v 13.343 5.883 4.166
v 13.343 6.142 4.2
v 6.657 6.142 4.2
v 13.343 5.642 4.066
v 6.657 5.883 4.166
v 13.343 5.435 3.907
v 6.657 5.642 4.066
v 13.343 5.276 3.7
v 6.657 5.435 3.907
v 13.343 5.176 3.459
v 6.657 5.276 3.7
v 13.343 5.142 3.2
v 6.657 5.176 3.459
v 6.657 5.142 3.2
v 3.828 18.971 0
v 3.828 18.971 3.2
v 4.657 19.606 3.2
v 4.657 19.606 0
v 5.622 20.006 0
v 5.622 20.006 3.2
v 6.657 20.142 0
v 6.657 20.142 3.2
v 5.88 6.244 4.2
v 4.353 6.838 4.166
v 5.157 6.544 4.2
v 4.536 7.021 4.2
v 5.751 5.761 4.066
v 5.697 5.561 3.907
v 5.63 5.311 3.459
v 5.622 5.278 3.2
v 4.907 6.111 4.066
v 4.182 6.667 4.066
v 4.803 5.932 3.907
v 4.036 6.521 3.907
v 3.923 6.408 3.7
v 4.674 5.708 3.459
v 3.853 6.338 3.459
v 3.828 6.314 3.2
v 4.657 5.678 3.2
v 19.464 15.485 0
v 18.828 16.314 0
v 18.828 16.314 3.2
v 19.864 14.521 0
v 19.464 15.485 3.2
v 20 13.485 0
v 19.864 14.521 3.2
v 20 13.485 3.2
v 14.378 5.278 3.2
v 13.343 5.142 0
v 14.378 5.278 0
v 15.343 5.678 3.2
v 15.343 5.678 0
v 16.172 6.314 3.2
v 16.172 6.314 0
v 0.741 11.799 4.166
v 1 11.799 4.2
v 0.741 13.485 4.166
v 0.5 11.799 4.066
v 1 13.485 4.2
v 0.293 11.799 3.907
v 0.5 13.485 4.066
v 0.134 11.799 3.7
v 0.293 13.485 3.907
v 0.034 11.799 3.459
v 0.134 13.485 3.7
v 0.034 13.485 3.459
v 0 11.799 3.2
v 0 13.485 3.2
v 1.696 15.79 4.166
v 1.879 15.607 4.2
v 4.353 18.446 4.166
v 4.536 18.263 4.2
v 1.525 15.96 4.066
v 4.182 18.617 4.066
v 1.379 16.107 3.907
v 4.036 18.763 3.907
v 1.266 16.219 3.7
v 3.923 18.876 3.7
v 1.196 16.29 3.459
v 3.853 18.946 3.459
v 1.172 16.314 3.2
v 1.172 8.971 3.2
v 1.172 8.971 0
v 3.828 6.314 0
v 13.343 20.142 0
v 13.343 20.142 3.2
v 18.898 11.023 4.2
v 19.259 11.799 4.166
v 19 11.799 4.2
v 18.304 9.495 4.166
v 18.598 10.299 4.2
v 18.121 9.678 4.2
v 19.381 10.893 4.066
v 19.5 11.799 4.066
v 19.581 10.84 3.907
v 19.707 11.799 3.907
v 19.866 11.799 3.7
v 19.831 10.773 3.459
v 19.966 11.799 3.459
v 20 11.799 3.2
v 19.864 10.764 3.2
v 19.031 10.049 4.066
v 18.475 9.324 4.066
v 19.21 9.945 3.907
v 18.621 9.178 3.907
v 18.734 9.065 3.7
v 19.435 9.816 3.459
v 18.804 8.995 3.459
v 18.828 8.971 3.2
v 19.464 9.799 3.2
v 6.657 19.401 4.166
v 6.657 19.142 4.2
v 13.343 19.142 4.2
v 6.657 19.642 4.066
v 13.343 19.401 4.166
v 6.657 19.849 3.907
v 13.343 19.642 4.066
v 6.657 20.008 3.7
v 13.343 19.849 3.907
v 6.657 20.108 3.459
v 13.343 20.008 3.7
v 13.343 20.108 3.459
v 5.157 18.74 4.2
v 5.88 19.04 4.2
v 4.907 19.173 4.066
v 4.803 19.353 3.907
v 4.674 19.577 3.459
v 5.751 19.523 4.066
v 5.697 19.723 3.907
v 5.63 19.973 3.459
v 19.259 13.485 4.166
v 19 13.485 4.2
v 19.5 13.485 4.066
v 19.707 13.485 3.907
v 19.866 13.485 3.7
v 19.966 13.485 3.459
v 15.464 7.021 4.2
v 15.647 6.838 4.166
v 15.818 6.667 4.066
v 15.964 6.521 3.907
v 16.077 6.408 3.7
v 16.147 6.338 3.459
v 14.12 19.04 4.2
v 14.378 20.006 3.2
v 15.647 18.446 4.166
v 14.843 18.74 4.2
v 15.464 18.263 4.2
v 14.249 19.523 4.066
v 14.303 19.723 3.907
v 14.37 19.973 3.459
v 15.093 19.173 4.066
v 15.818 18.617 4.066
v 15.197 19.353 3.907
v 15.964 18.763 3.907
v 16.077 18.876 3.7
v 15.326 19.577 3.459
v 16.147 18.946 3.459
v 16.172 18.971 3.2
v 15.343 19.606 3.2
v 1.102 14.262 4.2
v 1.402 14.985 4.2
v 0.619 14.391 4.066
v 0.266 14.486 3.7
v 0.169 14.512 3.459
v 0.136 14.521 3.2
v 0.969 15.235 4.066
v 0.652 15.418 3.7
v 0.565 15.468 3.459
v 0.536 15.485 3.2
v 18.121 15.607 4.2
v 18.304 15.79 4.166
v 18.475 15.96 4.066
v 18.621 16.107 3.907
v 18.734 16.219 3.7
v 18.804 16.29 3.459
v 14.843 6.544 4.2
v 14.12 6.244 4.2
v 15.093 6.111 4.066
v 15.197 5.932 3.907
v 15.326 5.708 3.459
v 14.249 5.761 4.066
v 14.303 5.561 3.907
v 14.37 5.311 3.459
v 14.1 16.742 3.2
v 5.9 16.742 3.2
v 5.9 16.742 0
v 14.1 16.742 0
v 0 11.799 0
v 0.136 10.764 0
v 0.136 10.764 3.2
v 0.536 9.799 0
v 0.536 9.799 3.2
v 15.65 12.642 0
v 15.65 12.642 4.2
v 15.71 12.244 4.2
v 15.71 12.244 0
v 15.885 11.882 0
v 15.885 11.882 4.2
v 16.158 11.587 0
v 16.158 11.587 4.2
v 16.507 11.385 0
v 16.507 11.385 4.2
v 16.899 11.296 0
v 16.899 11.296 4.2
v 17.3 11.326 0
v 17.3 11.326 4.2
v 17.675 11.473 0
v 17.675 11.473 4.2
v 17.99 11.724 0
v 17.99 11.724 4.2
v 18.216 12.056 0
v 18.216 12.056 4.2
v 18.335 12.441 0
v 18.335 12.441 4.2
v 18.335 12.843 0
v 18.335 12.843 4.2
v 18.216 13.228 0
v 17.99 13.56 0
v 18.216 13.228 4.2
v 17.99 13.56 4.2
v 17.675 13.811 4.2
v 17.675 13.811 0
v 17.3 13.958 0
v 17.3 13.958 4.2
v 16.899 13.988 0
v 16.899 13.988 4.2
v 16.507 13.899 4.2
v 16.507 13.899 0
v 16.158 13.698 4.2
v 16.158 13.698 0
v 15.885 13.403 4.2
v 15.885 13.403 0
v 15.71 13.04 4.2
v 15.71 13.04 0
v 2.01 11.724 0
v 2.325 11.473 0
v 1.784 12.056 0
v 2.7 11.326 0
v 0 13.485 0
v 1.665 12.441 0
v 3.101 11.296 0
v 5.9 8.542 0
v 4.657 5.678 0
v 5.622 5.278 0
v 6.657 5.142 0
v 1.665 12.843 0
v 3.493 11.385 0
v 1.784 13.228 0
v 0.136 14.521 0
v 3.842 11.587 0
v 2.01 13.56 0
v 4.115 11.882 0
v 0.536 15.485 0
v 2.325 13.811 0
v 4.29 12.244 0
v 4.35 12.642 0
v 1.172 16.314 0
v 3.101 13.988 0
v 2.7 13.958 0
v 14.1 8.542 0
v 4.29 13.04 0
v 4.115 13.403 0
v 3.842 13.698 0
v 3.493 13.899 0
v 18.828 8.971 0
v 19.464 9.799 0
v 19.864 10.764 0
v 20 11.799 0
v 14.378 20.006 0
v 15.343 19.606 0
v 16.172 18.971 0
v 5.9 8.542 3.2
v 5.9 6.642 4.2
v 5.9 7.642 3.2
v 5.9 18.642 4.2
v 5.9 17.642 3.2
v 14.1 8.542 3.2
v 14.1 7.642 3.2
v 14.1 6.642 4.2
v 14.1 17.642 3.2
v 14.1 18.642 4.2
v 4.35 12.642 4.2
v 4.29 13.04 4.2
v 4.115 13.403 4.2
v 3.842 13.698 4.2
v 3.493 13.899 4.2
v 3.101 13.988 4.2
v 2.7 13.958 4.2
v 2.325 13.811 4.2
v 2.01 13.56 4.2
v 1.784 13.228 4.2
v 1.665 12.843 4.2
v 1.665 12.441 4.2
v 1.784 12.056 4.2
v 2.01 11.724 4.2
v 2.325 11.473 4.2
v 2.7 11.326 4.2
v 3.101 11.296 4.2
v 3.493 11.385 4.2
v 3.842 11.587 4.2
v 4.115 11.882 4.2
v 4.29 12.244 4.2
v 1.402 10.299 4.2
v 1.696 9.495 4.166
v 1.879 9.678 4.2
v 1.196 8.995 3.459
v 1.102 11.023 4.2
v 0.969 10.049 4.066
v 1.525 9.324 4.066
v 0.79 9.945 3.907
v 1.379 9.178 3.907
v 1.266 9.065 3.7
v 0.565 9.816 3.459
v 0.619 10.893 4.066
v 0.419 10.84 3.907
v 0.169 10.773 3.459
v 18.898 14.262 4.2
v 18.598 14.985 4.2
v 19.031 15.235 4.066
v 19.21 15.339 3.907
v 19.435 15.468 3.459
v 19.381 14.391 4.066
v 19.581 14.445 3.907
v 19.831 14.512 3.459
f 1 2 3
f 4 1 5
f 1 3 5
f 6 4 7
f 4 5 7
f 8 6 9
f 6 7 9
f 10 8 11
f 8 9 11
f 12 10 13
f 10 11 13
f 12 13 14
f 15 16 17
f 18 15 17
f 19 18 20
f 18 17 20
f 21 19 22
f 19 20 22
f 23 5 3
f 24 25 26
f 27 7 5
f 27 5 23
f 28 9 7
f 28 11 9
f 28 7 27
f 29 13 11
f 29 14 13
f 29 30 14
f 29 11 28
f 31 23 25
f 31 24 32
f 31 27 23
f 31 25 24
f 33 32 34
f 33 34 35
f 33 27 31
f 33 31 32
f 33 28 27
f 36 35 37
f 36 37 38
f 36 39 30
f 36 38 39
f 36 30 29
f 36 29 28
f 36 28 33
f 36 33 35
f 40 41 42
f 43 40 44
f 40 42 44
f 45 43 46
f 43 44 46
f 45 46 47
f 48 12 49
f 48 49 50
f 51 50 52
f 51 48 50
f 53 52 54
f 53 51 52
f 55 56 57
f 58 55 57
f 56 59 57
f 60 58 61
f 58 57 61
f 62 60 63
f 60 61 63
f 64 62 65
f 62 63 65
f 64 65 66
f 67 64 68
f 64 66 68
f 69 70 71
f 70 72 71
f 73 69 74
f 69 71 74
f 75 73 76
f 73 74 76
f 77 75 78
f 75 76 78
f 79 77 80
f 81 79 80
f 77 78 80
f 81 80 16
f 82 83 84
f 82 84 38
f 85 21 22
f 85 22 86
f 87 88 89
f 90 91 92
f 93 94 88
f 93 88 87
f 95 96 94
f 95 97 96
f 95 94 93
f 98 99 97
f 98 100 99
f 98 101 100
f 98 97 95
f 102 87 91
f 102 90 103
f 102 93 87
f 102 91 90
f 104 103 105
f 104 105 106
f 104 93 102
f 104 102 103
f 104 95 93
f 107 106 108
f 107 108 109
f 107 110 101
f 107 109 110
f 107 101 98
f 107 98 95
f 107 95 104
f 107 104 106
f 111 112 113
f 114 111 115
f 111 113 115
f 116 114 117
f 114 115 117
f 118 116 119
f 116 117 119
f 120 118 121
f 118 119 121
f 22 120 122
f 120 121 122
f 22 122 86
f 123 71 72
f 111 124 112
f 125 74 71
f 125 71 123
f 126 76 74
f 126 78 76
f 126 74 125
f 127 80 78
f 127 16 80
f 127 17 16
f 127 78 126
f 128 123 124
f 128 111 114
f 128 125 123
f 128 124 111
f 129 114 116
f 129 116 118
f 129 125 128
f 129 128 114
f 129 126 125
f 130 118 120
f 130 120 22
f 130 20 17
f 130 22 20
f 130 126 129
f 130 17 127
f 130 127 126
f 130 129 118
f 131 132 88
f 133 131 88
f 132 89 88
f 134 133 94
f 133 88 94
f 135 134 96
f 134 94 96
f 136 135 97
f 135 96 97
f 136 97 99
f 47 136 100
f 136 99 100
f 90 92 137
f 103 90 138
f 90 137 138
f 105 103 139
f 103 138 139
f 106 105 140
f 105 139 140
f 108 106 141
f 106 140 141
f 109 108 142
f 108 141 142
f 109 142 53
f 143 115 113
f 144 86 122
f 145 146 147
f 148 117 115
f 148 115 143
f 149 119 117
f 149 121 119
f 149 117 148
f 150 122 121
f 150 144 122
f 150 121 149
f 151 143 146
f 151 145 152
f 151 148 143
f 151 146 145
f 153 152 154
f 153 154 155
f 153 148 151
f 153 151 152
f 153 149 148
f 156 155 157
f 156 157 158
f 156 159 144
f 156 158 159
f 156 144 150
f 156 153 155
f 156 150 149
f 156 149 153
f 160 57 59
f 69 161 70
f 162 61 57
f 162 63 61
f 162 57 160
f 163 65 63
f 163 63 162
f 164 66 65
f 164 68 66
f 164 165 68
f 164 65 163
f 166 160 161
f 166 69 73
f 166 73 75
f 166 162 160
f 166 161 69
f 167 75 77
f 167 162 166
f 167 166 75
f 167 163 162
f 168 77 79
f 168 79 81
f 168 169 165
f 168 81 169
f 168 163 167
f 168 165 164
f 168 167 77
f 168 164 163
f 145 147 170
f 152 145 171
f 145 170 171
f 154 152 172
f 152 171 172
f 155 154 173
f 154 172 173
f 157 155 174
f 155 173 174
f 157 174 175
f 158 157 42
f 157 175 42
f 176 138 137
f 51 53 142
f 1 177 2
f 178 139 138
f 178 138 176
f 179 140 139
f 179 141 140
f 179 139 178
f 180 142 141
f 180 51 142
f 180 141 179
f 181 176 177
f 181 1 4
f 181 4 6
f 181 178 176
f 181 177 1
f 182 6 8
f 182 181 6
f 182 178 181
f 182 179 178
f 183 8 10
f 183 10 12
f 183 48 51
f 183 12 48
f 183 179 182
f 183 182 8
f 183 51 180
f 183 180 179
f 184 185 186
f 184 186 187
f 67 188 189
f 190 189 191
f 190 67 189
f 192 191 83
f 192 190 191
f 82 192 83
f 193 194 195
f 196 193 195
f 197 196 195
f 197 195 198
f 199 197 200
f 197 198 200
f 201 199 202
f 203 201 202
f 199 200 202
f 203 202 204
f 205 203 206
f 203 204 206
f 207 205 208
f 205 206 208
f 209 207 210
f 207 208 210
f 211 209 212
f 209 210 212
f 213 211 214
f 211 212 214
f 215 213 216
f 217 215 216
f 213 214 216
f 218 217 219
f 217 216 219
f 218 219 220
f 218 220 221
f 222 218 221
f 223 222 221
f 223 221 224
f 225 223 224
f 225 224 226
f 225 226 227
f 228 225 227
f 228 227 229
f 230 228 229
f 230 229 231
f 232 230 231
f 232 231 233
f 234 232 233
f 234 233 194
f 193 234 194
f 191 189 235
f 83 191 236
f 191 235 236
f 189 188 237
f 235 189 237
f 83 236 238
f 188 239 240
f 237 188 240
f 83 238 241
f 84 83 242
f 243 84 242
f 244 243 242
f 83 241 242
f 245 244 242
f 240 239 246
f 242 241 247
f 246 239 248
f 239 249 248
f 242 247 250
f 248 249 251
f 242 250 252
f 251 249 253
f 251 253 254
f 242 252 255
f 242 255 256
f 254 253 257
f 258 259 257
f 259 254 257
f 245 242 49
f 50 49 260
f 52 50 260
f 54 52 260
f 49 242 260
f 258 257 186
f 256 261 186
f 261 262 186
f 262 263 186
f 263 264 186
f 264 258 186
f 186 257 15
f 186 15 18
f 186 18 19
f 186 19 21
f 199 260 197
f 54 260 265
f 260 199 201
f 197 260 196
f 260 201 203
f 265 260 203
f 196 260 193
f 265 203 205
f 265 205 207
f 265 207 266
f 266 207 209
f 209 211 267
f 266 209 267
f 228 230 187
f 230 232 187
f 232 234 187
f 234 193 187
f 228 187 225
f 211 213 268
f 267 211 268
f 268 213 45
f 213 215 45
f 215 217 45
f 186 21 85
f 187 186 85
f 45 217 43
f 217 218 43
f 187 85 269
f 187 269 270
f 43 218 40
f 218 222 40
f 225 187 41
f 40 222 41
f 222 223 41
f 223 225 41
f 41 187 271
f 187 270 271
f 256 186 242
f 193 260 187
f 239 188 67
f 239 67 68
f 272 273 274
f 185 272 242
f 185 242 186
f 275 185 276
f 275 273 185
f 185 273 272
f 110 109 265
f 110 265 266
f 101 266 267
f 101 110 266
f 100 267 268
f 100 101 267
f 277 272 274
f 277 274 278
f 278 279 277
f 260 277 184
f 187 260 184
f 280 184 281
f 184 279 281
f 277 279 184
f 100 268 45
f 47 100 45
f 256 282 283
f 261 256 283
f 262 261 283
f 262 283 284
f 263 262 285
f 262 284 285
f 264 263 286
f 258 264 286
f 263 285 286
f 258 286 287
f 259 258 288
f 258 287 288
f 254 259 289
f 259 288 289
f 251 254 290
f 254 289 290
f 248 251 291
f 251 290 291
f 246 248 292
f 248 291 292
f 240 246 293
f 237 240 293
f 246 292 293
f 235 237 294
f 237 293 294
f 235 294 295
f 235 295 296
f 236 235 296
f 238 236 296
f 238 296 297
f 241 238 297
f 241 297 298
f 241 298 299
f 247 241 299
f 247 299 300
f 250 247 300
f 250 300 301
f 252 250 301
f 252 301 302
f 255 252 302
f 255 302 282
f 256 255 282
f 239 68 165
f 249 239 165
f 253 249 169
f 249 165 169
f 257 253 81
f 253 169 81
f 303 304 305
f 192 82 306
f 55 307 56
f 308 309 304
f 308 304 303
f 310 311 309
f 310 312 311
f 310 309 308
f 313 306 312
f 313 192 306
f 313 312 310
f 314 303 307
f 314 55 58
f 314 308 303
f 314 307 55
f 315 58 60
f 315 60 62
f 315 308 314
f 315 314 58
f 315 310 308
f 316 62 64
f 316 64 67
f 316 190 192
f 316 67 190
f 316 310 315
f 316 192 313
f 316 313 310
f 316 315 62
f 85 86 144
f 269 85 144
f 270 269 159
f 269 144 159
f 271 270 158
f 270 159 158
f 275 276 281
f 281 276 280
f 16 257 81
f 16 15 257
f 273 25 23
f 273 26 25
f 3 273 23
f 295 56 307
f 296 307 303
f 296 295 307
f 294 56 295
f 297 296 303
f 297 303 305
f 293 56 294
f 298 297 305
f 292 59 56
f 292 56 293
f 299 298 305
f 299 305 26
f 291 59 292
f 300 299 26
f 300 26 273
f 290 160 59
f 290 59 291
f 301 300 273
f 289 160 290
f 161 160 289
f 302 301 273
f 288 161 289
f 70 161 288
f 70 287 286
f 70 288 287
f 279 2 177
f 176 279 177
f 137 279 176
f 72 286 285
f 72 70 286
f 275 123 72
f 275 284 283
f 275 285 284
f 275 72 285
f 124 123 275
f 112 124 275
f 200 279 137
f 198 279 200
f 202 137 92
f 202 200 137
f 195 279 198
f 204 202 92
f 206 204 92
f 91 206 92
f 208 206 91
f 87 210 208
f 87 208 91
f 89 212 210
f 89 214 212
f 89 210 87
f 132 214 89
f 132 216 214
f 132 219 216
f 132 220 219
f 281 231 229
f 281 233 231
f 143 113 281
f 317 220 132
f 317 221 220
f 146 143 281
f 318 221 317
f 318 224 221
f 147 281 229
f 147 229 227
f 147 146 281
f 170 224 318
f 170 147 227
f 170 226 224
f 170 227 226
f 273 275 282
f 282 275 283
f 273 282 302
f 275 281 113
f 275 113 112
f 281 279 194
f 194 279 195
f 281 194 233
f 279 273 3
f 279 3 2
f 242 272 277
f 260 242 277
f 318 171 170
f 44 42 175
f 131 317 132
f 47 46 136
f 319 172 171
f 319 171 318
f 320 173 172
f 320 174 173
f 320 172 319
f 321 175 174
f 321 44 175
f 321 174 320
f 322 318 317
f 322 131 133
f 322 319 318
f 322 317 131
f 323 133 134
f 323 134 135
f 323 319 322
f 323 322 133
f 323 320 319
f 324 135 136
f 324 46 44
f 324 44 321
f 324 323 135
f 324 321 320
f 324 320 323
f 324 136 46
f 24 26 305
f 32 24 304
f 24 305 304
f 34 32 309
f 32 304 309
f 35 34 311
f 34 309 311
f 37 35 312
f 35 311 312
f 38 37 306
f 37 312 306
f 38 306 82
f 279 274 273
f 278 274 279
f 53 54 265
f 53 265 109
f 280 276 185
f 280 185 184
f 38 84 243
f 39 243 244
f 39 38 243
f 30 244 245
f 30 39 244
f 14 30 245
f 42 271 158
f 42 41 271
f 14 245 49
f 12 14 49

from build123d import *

# Parameters (mm, degrees)
SKETCH1_W           = 20
SKETCH1_H           = 15
BOSS_EXTRUDE1_DEPTH = 4.2
SKETCH2_W           = 8.2
SKETCH2_H           = 10
CUT_EXTRUDE1_DEPTH  = 1
SKETCH3_W           = 8.2
SKETCH3_H           = 8.2
CUT_EXTRUDE2_DEPTH  = 29.564762277
CHAMFER1_SIZE       = 1
SKETCH4_R           = 1.35
CUT_EXTRUDE3_DEPTH  = 29.694000139
CHAMFER2_SIZE       = 5
FILLET1_R           = 4
FILLET2_R           = 1


with BuildPart() as part:
    # Sketch1 → Boss-Extrude1 (new body)
    with BuildSketch(Plane.XY):
        with Locations((10, 12.642136033)):
            Rectangle(SKETCH1_W, SKETCH1_H)
    extrude(amount=BOSS_EXTRUDE1_DEPTH)

    # Sketch2 → Cut-Extrude1 (cut)
    with BuildSketch(Plane.XY.offset(4.2)):
        with Locations((10, 12.642136033)):
            Rectangle(SKETCH2_W, SKETCH2_H)
    extrude(amount=-CUT_EXTRUDE1_DEPTH, mode=Mode.SUBTRACT)

    # Sketch3 → Cut-Extrude2 (cut, through all)
    with BuildSketch(Plane.XY.offset(3.2)):
        with Locations((10, 12.642136033)):
            Rectangle(SKETCH3_W, SKETCH3_H)
    extrude(amount=-CUT_EXTRUDE2_DEPTH, mode=Mode.SUBTRACT)

    # Chamfer1
    chamfer1_edges = [part.edges().sort_by_distance(p)[0] for p in [
        (10, 7.642136033, 4.2),
        (10, 17.642136033, 4.2),
    ]]
    chamfer(chamfer1_edges, length=CHAMFER1_SIZE - 0.0001)  # a hair under: the kernel refuses the full size

    # Sketch4 → Cut-Extrude3 (cut, through all)
    with BuildSketch(Plane.XY.offset(4.2)):
        with Locations((3, 12.642136033)):
            Circle(SKETCH4_R)
        with Locations(Location((17, 12.642136033, 0), (0, 0, 180))):
            Circle(SKETCH4_R)
    extrude(amount=-CUT_EXTRUDE3_DEPTH, mode=Mode.SUBTRACT)

    # Chamfer2
    chamfer2_edges = [part.edges().sort_by_distance(p)[0] for p in [
        (0, 20.142136033, 2.1),
        (20, 20.142136033, 2.1),
        (20, 5.142136033, 2.1),
        (0, 5.142136033, 2.1),
    ]]
    chamfer(chamfer2_edges, length=CHAMFER2_SIZE)

    # Fillet1
    fillet1_edges = [part.edges().sort_by_distance(p)[0] for p in [
        (0, 10.142136033, 2.1),
        (0, 15.142136033, 2.1),
        (15, 20.142136033, 2.1),
        (5, 20.142136033, 2.1),
        (15, 5.142136033, 2.1),
        (5, 5.142136033, 2.1),
        (20, 15.142136033, 2.1),
        (20, 10.142136033, 2.1),
    ]]
    fillet(fillet1_edges, radius=FILLET1_R)

    # Fillet2
    fillet2_edges = [part.edges().sort_by_distance(p)[0] for p in [
        (2.5, 17.642136033, 4.2),
        (10, 20.142136033, 4.2),
        (2.5, 7.642136033, 4.2),
        (10, 5.142136033, 4.2),
        (17.5, 7.642136033, 4.2),
        (20, 12.642136033, 4.2),
        (17.5, 17.642136033, 4.2),
        (0.30448187, 10.268256553, 4.2),
        (5.12612052, 5.446617903, 4.2),
        (14.87387948, 5.446617903, 4.2),
        (19.69551813, 10.268256553, 4.2),
        (19.69551813, 15.016015513, 4.2),
        (14.87387948, 19.837654163, 4.2),
        (5.12612052, 19.837654163, 4.2),
        (0.30448187, 15.016015513, 4.2),
        (0, 12.642136033, 4.2),
    ]]
    fillet(fillet2_edges, radius=FILLET2_R)


solid = part.part
